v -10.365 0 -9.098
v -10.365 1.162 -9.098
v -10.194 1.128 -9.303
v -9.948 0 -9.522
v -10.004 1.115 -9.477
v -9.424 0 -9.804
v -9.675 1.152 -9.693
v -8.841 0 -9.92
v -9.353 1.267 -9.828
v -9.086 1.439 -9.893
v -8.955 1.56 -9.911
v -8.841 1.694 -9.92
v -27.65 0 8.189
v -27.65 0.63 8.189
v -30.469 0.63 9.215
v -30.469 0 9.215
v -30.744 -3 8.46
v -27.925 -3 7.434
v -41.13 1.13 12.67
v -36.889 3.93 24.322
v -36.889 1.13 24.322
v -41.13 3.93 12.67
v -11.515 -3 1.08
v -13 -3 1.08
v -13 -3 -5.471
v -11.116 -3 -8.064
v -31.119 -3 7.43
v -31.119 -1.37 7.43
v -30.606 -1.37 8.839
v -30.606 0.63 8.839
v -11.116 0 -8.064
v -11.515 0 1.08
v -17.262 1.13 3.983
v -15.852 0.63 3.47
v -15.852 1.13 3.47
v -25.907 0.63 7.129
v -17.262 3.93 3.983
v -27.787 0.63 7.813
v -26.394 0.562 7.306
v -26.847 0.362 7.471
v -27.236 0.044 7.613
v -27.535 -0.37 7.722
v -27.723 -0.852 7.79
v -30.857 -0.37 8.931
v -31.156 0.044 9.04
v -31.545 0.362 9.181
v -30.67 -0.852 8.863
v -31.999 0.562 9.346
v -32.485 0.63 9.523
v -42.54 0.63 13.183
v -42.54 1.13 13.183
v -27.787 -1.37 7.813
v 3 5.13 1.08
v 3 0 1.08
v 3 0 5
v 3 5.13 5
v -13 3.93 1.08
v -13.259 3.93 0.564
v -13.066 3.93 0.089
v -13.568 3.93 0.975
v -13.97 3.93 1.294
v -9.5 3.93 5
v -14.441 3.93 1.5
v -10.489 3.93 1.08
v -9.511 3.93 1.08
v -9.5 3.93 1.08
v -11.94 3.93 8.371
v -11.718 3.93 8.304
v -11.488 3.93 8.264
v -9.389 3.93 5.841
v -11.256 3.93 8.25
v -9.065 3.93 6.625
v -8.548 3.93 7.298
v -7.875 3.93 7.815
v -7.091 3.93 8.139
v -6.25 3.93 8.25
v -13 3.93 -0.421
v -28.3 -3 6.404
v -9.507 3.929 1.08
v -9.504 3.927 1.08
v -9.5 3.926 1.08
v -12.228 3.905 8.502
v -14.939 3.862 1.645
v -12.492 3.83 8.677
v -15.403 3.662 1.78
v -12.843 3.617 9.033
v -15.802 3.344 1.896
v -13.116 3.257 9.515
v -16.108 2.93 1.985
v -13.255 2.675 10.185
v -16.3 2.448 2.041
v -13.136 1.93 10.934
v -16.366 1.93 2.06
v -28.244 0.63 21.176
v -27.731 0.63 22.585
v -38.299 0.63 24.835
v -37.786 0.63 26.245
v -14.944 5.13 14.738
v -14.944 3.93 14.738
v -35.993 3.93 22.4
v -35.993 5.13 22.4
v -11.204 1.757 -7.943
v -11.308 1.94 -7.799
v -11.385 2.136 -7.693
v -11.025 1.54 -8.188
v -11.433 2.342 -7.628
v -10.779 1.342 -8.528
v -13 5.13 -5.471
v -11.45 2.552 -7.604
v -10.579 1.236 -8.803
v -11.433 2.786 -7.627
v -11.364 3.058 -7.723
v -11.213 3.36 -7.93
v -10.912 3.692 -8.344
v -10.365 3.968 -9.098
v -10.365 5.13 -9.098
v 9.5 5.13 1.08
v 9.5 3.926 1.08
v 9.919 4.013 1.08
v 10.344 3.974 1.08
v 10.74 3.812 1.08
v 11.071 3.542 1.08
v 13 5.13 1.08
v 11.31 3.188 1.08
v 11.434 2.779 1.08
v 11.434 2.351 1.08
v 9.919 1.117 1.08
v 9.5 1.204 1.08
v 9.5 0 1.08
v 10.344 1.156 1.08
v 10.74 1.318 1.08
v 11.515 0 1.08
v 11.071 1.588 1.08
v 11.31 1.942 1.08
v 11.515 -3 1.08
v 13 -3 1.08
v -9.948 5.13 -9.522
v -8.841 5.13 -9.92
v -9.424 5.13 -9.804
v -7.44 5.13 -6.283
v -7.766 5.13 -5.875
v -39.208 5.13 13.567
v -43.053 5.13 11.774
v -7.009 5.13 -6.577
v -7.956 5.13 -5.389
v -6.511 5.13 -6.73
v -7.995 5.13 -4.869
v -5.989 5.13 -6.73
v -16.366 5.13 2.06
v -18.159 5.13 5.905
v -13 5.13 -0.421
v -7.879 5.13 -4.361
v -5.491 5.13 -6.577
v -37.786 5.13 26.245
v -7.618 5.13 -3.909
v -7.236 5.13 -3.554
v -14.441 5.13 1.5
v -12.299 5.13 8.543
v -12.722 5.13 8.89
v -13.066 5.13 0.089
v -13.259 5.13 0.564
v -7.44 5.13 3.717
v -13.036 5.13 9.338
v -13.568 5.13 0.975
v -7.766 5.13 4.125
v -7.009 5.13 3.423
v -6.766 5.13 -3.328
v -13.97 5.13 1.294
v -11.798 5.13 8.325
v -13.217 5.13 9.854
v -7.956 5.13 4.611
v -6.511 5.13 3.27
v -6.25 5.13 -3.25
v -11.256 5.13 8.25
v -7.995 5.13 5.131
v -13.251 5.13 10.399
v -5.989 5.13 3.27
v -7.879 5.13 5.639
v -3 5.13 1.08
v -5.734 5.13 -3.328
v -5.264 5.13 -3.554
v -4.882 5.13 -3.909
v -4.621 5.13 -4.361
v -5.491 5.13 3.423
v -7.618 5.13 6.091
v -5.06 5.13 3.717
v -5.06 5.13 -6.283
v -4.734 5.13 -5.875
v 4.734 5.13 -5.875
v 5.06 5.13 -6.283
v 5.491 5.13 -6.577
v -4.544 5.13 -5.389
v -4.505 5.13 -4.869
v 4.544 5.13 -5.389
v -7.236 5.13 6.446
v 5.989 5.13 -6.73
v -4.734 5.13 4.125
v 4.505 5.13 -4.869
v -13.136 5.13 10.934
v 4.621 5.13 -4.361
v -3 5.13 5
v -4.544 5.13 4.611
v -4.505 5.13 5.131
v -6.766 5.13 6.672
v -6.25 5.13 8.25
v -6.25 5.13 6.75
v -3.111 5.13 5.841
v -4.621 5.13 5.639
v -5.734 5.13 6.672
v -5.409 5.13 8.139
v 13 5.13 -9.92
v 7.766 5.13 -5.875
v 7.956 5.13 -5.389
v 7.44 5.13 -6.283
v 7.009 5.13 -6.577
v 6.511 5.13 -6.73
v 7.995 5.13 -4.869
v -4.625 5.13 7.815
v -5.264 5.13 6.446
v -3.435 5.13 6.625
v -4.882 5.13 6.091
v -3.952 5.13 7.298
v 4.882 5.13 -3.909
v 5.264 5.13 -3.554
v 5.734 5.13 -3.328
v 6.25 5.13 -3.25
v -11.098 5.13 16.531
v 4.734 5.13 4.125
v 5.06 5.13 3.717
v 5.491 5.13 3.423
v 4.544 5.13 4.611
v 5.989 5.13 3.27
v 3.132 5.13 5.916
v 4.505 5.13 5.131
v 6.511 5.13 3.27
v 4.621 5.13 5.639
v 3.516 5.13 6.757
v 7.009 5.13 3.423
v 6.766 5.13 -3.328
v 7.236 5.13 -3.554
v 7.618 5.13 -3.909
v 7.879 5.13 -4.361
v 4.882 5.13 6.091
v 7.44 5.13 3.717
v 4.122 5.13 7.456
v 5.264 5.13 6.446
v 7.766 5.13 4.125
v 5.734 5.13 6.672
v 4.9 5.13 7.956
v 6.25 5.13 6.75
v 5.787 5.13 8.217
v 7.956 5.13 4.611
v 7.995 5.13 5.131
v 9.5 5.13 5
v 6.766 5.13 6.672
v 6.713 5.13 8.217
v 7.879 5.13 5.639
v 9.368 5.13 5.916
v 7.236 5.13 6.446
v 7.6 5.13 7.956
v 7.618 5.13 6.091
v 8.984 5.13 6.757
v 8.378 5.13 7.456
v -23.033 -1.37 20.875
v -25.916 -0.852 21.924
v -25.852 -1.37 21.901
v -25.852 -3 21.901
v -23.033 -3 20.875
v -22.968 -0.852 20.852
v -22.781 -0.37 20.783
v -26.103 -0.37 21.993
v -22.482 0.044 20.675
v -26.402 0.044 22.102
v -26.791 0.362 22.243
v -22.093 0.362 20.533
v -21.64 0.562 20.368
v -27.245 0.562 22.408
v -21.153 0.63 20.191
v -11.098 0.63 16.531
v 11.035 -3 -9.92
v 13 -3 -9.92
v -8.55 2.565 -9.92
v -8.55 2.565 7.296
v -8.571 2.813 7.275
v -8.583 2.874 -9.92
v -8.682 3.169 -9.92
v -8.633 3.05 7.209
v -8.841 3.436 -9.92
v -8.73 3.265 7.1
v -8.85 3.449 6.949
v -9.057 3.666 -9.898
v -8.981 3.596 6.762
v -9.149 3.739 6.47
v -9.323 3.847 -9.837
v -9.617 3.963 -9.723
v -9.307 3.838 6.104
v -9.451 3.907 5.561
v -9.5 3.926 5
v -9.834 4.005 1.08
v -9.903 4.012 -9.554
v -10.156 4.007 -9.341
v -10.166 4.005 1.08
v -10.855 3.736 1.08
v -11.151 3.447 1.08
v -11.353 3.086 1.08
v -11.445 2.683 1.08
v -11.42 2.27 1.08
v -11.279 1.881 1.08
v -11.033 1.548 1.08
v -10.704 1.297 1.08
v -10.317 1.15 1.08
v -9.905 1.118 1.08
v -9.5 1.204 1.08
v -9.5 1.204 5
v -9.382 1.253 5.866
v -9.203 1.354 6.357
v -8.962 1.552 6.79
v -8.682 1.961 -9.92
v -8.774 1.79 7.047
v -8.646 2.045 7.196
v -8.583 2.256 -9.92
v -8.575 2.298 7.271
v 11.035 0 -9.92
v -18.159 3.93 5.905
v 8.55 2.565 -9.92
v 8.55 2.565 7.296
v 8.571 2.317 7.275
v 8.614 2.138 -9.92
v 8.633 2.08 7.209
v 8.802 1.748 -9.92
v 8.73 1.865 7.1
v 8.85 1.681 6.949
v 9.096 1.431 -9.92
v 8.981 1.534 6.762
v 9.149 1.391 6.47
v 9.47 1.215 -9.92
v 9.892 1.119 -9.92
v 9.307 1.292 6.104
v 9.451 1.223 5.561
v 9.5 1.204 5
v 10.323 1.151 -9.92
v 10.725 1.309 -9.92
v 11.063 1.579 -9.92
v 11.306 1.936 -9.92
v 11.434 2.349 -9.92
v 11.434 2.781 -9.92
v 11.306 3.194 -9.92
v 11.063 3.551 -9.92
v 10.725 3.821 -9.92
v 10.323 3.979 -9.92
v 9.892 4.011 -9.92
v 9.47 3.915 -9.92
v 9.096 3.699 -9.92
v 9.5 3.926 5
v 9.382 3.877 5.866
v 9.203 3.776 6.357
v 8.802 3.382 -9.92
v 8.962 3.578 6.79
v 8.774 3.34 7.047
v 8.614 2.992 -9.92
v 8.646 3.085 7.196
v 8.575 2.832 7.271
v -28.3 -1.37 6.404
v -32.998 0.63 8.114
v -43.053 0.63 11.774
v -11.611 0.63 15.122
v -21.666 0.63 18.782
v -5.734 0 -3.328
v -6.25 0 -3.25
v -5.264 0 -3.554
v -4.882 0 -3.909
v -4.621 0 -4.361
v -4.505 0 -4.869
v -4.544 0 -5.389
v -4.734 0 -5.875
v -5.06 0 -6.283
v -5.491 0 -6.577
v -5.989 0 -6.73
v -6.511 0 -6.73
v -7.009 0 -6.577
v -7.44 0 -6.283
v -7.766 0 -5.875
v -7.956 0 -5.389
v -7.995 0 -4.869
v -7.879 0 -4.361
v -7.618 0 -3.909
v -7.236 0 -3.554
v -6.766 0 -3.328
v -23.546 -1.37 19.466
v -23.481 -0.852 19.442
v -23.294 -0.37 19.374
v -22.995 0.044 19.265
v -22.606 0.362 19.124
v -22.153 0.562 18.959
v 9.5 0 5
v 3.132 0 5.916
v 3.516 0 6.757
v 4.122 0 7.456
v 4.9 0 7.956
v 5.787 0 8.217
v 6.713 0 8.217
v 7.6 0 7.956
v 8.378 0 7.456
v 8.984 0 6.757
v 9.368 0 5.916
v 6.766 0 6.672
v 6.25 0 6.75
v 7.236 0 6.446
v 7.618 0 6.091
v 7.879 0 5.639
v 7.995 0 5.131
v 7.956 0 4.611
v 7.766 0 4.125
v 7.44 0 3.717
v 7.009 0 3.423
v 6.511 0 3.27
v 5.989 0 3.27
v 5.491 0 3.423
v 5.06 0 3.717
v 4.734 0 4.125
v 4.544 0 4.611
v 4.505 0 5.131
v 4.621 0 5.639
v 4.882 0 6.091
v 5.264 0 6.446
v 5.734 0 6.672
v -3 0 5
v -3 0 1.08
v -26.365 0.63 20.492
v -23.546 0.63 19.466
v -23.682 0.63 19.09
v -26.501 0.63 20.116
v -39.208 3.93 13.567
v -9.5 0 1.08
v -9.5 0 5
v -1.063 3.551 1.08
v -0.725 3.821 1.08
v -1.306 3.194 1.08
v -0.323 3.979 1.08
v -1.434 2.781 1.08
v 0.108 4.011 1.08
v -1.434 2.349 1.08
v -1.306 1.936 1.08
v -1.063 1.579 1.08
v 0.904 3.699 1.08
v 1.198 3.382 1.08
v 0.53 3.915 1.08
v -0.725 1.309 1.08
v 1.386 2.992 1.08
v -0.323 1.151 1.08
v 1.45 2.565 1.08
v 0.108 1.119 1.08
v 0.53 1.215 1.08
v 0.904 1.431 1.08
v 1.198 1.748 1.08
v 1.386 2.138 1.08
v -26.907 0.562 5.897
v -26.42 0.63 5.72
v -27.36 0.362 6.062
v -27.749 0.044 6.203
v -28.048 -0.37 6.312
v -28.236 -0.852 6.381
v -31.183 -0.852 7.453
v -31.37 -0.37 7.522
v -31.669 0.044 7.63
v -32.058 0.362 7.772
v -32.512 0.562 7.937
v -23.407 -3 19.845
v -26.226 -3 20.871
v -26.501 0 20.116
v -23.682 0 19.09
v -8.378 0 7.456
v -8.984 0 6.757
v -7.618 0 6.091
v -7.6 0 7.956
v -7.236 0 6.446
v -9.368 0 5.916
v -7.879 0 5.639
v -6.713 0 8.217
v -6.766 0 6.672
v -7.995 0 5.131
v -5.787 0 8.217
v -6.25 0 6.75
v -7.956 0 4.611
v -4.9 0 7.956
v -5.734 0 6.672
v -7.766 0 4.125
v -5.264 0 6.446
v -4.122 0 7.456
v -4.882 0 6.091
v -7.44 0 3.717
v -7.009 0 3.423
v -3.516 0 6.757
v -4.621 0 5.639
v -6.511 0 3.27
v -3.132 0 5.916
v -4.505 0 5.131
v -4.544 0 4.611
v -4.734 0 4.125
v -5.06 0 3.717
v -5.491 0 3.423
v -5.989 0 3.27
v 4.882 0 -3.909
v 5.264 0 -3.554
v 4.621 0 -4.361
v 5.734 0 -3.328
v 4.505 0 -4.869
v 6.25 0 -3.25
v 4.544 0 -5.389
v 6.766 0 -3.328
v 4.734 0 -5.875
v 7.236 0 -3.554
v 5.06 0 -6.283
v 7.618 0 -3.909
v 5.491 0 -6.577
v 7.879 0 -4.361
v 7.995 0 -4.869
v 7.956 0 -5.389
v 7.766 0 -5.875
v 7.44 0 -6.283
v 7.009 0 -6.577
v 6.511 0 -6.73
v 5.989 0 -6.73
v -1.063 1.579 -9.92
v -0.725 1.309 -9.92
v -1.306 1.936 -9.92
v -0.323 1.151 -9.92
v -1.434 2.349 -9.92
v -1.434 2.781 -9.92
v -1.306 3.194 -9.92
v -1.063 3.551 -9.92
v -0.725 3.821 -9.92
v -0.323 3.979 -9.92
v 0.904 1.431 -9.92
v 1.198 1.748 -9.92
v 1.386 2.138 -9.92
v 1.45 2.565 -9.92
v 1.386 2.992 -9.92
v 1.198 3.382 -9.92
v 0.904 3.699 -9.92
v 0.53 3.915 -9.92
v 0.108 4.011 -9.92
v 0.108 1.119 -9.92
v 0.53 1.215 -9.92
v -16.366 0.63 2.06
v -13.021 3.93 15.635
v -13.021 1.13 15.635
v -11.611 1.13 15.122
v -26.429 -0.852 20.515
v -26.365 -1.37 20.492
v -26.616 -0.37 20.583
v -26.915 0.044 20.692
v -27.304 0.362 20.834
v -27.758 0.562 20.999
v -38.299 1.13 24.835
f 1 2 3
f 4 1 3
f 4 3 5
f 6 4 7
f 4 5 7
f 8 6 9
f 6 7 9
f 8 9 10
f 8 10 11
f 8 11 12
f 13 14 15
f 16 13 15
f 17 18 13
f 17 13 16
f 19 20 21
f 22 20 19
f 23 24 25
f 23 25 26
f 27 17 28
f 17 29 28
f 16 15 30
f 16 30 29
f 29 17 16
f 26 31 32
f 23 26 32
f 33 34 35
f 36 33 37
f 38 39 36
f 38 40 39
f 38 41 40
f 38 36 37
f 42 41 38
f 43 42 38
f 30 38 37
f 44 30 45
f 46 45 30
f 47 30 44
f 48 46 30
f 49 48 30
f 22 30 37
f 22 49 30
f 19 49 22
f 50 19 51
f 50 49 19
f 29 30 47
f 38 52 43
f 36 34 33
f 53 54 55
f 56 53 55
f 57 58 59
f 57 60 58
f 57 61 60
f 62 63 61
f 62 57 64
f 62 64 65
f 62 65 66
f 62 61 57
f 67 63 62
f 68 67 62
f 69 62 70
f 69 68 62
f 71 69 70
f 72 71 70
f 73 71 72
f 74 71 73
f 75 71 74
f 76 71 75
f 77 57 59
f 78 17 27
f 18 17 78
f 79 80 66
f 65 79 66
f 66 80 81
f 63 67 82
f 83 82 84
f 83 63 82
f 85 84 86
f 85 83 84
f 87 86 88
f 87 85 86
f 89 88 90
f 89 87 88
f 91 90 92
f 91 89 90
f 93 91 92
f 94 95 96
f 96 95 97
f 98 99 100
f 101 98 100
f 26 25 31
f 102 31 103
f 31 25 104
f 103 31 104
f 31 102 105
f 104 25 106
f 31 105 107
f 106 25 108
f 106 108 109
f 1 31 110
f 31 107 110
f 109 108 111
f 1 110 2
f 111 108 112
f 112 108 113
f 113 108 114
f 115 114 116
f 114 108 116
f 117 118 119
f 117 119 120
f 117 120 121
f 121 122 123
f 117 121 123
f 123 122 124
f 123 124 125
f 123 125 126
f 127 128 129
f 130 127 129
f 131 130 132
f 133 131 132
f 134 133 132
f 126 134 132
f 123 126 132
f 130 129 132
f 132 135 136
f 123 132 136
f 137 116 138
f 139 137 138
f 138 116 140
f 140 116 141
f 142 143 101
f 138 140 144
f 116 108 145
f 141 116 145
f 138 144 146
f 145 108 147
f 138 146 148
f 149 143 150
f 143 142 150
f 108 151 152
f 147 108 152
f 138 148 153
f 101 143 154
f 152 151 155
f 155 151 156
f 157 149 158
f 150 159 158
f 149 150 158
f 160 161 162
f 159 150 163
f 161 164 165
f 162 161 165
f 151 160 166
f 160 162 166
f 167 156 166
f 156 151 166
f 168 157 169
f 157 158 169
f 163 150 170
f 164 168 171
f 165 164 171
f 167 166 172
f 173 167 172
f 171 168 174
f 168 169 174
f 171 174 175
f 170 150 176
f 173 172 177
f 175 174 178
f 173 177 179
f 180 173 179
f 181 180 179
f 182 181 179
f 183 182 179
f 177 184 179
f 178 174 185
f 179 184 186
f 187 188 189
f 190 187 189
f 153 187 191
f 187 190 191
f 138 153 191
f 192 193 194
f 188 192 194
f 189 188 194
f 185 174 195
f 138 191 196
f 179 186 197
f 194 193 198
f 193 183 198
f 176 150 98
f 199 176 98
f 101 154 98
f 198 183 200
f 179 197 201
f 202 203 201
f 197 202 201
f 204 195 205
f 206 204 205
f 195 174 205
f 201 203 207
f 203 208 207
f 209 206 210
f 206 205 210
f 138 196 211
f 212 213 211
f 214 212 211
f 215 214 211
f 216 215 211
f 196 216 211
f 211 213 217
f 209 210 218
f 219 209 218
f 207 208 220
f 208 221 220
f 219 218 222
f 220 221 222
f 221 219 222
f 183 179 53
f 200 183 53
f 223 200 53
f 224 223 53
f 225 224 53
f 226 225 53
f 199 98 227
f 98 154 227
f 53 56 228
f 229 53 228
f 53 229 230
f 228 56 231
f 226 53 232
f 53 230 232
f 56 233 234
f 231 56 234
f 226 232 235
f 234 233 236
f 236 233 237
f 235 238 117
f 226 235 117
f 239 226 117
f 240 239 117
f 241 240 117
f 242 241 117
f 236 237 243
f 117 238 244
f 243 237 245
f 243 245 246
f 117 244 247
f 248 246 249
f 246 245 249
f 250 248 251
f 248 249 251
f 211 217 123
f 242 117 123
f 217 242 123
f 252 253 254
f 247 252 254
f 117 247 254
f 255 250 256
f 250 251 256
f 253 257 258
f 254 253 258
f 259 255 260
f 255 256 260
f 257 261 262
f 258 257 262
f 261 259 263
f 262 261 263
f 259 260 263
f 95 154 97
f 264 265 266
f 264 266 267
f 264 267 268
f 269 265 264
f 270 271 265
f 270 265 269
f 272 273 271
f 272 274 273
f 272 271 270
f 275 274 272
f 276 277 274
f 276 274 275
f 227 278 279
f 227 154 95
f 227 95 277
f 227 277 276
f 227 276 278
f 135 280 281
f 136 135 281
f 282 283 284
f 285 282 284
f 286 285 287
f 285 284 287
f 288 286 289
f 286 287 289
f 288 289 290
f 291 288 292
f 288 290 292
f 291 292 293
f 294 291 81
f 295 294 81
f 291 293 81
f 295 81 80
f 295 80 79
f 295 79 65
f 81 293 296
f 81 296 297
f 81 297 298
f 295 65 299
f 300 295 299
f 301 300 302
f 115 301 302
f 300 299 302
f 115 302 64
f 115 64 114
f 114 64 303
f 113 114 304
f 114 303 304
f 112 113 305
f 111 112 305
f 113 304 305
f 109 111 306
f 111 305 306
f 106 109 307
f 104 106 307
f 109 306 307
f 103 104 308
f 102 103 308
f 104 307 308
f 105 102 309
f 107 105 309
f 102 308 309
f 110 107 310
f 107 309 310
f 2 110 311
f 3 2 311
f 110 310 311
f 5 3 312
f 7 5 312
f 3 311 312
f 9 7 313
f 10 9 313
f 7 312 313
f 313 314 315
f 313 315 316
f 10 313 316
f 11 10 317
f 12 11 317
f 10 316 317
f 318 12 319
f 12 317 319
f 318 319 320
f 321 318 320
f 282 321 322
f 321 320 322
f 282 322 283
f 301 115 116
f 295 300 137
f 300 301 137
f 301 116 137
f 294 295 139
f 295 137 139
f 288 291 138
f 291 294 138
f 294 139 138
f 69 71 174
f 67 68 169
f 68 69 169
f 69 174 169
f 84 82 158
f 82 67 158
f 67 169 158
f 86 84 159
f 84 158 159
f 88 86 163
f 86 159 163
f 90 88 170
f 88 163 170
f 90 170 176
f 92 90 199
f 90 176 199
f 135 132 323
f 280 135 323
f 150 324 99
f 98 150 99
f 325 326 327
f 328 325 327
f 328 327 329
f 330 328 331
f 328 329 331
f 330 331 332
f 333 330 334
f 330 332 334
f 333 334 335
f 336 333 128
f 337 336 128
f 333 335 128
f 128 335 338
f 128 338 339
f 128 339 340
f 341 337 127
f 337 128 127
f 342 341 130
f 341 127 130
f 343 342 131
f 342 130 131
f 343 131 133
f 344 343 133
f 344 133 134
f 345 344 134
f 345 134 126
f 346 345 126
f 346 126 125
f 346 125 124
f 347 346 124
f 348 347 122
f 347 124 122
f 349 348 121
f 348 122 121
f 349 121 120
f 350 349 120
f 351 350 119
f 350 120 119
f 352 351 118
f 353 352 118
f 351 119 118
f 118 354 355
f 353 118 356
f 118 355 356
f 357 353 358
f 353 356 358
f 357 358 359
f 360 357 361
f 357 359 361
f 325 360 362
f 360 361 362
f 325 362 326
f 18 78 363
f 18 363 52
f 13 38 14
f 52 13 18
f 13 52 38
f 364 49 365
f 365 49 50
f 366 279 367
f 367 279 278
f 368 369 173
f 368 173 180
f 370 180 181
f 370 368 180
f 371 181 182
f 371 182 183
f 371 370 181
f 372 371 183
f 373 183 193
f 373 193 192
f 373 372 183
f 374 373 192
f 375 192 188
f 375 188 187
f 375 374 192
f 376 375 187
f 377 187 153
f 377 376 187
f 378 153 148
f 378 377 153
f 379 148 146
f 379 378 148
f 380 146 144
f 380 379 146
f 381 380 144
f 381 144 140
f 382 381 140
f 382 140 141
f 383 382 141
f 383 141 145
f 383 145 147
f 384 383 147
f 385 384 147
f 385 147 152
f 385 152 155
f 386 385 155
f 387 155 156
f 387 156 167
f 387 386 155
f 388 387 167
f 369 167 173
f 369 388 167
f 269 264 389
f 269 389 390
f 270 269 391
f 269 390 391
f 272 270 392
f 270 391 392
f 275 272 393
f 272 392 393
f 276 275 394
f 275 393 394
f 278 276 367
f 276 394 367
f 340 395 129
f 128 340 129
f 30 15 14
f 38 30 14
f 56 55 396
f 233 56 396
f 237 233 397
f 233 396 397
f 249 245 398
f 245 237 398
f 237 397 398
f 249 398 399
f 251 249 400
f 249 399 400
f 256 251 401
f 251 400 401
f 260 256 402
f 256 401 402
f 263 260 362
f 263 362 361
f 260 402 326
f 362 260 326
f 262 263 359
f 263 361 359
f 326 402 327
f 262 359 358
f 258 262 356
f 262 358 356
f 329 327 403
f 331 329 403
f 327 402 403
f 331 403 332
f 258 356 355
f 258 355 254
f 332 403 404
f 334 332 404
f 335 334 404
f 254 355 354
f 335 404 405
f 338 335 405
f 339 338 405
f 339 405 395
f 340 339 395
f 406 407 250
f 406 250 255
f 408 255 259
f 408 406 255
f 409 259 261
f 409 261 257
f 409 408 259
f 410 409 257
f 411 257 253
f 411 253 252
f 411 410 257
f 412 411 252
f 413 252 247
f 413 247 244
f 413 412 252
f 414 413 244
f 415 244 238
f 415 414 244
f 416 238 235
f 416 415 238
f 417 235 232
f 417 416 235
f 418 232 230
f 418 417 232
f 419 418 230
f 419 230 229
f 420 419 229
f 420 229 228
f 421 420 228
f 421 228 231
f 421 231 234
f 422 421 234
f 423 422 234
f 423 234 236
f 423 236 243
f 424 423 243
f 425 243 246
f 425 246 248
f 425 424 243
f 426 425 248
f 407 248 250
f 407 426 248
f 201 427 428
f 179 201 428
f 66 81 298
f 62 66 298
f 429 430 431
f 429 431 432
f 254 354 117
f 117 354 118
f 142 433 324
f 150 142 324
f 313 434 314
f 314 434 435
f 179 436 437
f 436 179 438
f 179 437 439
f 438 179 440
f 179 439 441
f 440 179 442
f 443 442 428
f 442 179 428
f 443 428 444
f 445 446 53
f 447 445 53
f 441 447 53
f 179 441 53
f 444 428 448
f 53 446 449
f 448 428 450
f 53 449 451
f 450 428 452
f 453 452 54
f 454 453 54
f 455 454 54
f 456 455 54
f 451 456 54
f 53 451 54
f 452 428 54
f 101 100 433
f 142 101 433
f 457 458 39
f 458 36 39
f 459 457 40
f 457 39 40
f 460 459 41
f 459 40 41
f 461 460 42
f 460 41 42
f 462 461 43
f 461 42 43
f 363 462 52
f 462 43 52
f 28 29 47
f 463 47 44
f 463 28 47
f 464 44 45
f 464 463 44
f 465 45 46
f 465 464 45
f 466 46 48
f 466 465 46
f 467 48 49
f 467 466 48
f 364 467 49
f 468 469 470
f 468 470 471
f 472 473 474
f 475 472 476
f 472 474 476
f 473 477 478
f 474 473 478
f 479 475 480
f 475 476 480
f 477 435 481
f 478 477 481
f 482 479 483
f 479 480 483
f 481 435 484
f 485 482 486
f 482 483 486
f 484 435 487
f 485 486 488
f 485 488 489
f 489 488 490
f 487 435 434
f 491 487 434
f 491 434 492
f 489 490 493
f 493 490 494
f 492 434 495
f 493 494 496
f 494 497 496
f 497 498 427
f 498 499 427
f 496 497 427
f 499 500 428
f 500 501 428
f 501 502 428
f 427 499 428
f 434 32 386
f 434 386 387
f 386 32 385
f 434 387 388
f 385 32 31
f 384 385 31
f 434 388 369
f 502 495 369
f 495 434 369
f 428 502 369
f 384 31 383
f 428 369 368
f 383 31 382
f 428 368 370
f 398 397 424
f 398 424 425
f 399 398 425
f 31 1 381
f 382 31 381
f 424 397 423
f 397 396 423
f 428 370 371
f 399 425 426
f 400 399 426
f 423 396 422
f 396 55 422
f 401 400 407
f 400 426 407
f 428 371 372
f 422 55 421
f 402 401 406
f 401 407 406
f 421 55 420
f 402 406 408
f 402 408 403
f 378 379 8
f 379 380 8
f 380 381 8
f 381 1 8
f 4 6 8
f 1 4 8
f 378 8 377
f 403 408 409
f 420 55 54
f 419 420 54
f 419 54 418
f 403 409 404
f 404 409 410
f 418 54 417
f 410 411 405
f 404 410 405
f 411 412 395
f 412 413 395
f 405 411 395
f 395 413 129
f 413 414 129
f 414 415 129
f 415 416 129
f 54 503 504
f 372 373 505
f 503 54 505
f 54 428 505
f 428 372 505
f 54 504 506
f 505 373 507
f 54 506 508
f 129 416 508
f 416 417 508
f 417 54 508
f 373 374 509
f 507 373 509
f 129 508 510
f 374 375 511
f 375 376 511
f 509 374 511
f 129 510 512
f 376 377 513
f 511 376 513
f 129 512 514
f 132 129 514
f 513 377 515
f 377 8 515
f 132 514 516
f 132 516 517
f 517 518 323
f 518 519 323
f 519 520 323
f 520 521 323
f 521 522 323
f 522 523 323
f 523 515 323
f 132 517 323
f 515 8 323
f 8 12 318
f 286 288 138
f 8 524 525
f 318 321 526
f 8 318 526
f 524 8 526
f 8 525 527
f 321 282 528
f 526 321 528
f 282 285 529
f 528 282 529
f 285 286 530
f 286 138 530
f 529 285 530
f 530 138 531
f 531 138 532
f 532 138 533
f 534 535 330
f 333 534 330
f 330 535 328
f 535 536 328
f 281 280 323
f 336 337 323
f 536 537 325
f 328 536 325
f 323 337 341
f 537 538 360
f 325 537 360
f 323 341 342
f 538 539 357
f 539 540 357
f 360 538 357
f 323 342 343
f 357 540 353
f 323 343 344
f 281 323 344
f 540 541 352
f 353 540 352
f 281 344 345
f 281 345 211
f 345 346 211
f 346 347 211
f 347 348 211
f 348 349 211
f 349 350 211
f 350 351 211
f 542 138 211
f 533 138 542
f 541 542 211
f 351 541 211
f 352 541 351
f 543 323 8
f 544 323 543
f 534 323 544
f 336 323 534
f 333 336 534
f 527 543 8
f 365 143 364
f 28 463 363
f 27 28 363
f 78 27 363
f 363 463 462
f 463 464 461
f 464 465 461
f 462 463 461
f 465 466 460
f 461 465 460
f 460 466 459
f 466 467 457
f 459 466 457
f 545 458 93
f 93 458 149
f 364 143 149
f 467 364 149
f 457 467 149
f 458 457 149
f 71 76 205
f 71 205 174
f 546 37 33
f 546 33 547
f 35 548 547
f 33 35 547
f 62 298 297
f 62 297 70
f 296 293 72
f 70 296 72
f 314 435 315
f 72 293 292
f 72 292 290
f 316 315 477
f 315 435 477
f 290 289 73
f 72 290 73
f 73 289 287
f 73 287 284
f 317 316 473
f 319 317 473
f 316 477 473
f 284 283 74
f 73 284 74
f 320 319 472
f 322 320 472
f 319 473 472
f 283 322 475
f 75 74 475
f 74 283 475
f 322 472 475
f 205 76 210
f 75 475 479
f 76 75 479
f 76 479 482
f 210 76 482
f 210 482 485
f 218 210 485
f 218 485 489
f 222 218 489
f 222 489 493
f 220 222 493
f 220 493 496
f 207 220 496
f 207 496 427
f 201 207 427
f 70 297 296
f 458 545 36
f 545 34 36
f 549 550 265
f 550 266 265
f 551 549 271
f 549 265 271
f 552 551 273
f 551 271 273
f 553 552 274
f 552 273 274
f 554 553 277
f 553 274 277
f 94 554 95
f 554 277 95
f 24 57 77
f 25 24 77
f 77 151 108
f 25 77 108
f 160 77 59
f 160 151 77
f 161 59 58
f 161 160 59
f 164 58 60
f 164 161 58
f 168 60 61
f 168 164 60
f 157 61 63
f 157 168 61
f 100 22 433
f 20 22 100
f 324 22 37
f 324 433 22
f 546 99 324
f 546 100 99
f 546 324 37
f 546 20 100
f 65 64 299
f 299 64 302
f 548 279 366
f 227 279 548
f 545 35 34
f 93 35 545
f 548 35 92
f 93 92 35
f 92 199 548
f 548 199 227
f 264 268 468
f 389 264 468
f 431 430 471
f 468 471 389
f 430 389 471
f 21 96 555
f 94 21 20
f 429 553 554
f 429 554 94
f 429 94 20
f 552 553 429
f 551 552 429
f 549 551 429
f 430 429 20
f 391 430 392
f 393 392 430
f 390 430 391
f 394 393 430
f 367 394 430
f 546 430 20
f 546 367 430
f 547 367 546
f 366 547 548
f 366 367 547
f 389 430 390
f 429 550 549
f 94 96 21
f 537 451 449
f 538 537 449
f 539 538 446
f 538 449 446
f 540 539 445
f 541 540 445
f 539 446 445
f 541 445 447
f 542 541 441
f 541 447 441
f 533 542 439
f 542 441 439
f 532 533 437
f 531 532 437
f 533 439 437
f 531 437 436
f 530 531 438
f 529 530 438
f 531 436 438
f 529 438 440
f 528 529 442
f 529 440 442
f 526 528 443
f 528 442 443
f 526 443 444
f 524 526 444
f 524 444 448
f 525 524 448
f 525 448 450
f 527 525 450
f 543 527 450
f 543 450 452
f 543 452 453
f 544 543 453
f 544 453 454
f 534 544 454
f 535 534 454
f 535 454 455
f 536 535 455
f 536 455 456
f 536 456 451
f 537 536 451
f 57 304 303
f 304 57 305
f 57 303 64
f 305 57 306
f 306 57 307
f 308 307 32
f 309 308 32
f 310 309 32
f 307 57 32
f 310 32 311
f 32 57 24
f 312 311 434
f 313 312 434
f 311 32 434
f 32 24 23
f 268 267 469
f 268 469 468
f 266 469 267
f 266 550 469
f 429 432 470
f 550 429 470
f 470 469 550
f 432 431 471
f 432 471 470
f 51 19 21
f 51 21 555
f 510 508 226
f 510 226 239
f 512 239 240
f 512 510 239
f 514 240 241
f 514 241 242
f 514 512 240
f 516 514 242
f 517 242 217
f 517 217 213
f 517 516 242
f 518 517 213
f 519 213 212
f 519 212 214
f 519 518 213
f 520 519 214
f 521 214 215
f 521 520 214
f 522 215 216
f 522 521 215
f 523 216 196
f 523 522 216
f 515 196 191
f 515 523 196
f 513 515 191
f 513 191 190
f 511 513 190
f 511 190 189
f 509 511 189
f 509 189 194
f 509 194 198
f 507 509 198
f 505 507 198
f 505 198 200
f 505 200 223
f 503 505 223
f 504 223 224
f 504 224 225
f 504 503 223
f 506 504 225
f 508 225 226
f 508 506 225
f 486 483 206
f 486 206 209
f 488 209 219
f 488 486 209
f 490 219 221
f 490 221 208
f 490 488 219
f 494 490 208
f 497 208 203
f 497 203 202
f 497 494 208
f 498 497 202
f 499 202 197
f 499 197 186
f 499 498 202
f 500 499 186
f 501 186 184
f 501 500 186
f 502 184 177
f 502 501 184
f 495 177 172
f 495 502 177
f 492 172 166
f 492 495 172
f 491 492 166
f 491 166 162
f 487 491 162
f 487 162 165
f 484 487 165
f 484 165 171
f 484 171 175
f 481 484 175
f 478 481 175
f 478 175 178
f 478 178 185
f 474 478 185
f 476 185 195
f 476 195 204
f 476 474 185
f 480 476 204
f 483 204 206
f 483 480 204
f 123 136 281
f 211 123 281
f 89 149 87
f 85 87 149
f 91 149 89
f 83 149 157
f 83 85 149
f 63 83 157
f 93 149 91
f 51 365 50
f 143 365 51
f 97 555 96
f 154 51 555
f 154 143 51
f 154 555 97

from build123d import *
from OCP.BRepFilletAPI import BRepFilletAPI_MakeChamfer

# Parameters (mm, degrees)
SKETCH1_W           = 26
SKETCH1_H           = 19.84
SKETCH1_R           = 1.7499999999999998
BOSS_EXTRUDE1_DEPTH = 5.13
CUT_EXTRUDE1_REACH  = 26.268
SKETCH2_R           = 1.45
BOSS_EXTRUDE2_DEPTH = 3
CUT_EXTRUDE2_REACH  = 20.262
CUT_EXTRUDE3_REACH  = 20.262
BOSS_EXTRUDE3_START = 1.2
BOSS_EXTRUDE3_DEPTH = 1.2
BOSS_EXTRUDE6_DEPTH = 3.3
BOSS_EXTRUDE7_DEPTH = 0.8
CUT_EXTRUDE4_DEPTH  = 0.5
CUT_EXTRUDE5_REACH  = 52.896
BOSS_EXTRUDE8_DEPTH = 2.83
FILLET1_R           = 2
CHAMFER1_SIZE       = 3
CHAMFER1_SIZE2      = 0.8038475772933701


with BuildPart() as part:
    # Sketch1 → Boss-Extrude1 (new body)
    with BuildSketch(Plane(origin=(0, 0, 0), x_dir=(1, 0, 0), z_dir=(0, 1, 0))):
        Rectangle(SKETCH1_W, SKETCH1_H)
        with Locations(Location((6.250000000000003, -4.999999999999995, 0), (0, 0, 270))):
            Circle(SKETCH1_R, mode=Mode.SUBTRACT)
        with Locations(Location((-6.250000000000001, -5, 0), (0, 0, 270))):
            Circle(SKETCH1_R, mode=Mode.SUBTRACT)
        with Locations(Location((-6.250000000000001, 5, 0), (0, 0, 270))):
            Circle(SKETCH1_R, mode=Mode.SUBTRACT)
        with Locations(Location((6.249999999999999, 4.999999999999998, 0), (0, 0, 270))):
            Circle(SKETCH1_R, mode=Mode.SUBTRACT)
    extrude(amount=BOSS_EXTRUDE1_DEPTH)

    # Sketch2 → Cut-Extrude1 (cut, up to next)
    with BuildSketch(Plane.XY.offset(9.92), mode=Mode.PRIVATE) as cut_extrude1_sk1:
        with Locations((0, 2.565)):
            Circle(SKETCH2_R)
    cut_extrude1_tool1 = extrude(cut_extrude1_sk1.sketch, amount=-CUT_EXTRUDE1_REACH, mode=Mode.PRIVATE) & part.part
    # Sketch2 → Cut-Extrude1 (cut, up to next)
    with BuildSketch(Plane.XY.offset(9.92), mode=Mode.PRIVATE) as cut_extrude1_sk2:
        with Locations((-10, 2.565)):
            Circle(SKETCH2_R)
    cut_extrude1_tool2 = extrude(cut_extrude1_sk2.sketch, amount=-CUT_EXTRUDE1_REACH, mode=Mode.PRIVATE) & part.part
    # Sketch2 → Cut-Extrude1 (cut, up to next)
    with BuildSketch(Plane.XY.offset(9.92), mode=Mode.PRIVATE) as cut_extrude1_sk3:
        with Locations(Location((10, 2.565, 0), (0, 0, 180))):
            Circle(SKETCH2_R)
    cut_extrude1_tool3 = extrude(cut_extrude1_sk3.sketch, amount=-CUT_EXTRUDE1_REACH, mode=Mode.PRIVATE) & part.part
    add(cut_extrude1_tool1.solids().sort_by_distance((0, 2.565, 9.92))[0], mode=Mode.SUBTRACT)
    add(cut_extrude1_tool2.solids().sort_by_distance((-10, 2.565, 9.92))[0], mode=Mode.SUBTRACT)
    add(cut_extrude1_tool3.solids().sort_by_distance((10, 2.565, 9.92))[0], mode=Mode.SUBTRACT)

    # Sketch3 → Boss-Extrude2 (add)
    with BuildSketch(Plane.XZ):
        with BuildLine():
            Line((-13, -9.919999999999998), (-11.034999999999997, -9.919999999999998))
            Line((-11.034999999999997, -9.92), (-11.63, 3.710000000000001))
            add(Edge.make_bspline(
                [(-11.63, 3.7100000000000013), (-10.51224572230246, 4.466321985960096), (-10.92, 6.040000000000002)],
                knots=[0, 0, 0, 1, 1, 1], degree=2))
            Line((-10.92, 6.040000000000002), (-9.0061377245509, 9.92))
            Line((-9.0061377245509, 9.92), (-13.000000000000002, 9.92))
            Line((-13.000000000000002, 9.92), (-13, -9.919999999999996))
        make_face()
        with BuildLine():
            Line((11.63, 3.7100000000000044), (11.035000000000004, -9.919999999999996))
            Line((11.035000000000004, -9.92), (13, -9.92))
            Line((12.999999999999998, -9.919999999999998), (12.999999999999995, 9.919999999999998))
            Line((12.999999999999995, 9.919999999999998), (9.006137724550902, 9.919999999999998))
            Line((9.0061377245509, 9.920000000000002), (10.92, 6.0400000000000045))
            add(Edge.make_bspline(
                [(11.63, 3.7100000000000044), (10.512245722302461, 4.466321985960101), (10.92, 6.0400000000000045)],
                knots=[0, 0, 0, 1, 1, 1], degree=2))
        make_face()
    extrude(amount=BOSS_EXTRUDE2_DEPTH)

    # Sketch4 → Cut-Extrude2 (cut, up to next)
    with BuildSketch(Plane.XZ.offset(3), mode=Mode.PRIVATE) as cut_extrude2_sk1:
        with BuildLine():
            Line((-13.000000000000002, 9.92), (-13.000000000000002, 1.0799999999999994))
            Line((-13.000000000000002, 1.0799999999999994), (-9.5, 1.0799999999999994))
            Line((-9.5, 1.0799999999999992), (-9.500000000000002, 5))
            ThreePointArc((-9.5, 4.999999999999999), (-6.250000000000002, 8.25), (-3.000000000000001, 5))
            Line((-3.000000000000001, 5), (-3.000000000000001, 1.0799999999999992))
            Line((-3.0000000000000018, 1.0799999999999994), (3.0000000000000018, 1.0799999999999994))
            Line((3.0000000000000027, 1.0799999999999992), (3.0000000000000036, 4.999999999999995))
            ThreePointArc((3.0000000000000027, 4.999999999999994), (6.250000000000002, 8.249999999999995), (9.500000000000004, 4.999999999999995))
            Line((9.500000000000002, 4.999999999999995), (9.500000000000002, 1.0799999999999992))
            Line((9.500000000000002, 1.0799999999999994), (11.515190755685987, 1.0799999999999994))
            Line((11.515190755685987, 1.0799999999999996), (11.63, 3.710000000000005))
            add(Edge.make_bspline(
                [(10.92, 6.0400000000000045), (10.512245722302461, 4.466321985960101), (11.63, 3.7100000000000044)],
                knots=[0, 0, 0, 1, 1, 1], degree=2))
            Line((10.92, 6.040000000000005), (9.006137724550895, 9.920000000000002))
            Line((9.006137724550895, 9.92), (-13.000000000000002, 9.92))
        make_face()
    cut_extrude2_tool1 = extrude(cut_extrude2_sk1.sketch, amount=-CUT_EXTRUDE2_REACH, mode=Mode.PRIVATE) & part.part
    # Sketch4 → Cut-Extrude2 (cut, up to next)
    with BuildSketch(Plane.XZ.offset(3), mode=Mode.PRIVATE) as cut_extrude2_sk2:
        with BuildLine():
            Line((12.999999999999998, 9.92), (9.006137724550895, 9.92))
            Line((9.006137724550895, 9.920000000000002), (10.92, 6.040000000000005))
            add(Edge.make_bspline(
                [(10.92, 6.0400000000000045), (10.512245722302461, 4.466321985960101), (11.63, 3.7100000000000044)],
                knots=[0, 0, 0, 1, 1, 1], degree=2))
            Line((11.63, 3.710000000000005), (11.515190755685987, 1.0799999999999996))
            Line((11.515190755685987, 1.0799999999999994), (12.999999999999998, 1.0799999999999994))
            Line((12.999999999999998, 1.08), (12.999999999999998, 9.92))
        make_face()
    cut_extrude2_tool2 = extrude(cut_extrude2_sk2.sketch, amount=-CUT_EXTRUDE2_REACH, mode=Mode.PRIVATE) & part.part
    add(cut_extrude2_tool1.solids().sort_by_distance((-1.890933, -3, 6.129401))[0], mode=Mode.SUBTRACT)
    add(cut_extrude2_tool2.solids().sort_by_distance((11.717022, -3, 6.350704))[0], mode=Mode.SUBTRACT)

    # Sketch5 → Cut-Extrude3 (cut, up to next)
    with BuildSketch(Plane(origin=(0, 5.13, 0), x_dir=(1, 0, 0), z_dir=(0, 1, 0)), mode=Mode.PRIVATE) as cut_extrude3_sk1:
        with BuildLine():
            Line((-13.000000000000002, 9.92), (-13.000000000000002, 5.470620579870581))
            Line((-13.000000000000004, 5.470620579870581), (-10.364706936690006, 9.097790307353499))
            ThreePointArc((-10.364706936690006, 9.097790307353499), (-9.696381549071102, 9.682348654000137), (-8.840876363748032, 9.919999999999996))
            Line((-8.840876363748032, 9.92), (-13.000000000000002, 9.92))
        make_face()
    cut_extrude3_tool1 = extrude(cut_extrude3_sk1.sketch, amount=-CUT_EXTRUDE3_REACH, mode=Mode.PRIVATE) & part.part
    add(cut_extrude3_tool1.solids().sort_by_distance((-11.876404, 5.13, -8.463849))[0], mode=Mode.SUBTRACT)

    # Sketch6 → Boss-Extrude3 (add)
    # profile 1 of 3: a face of its own
    with BuildSketch(Plane.XZ.offset(-5.13).offset(BOSS_EXTRUDE3_START)):
        Polygon((-11.098405421888891, 16.531452984385147), (-37.78567585220869, 26.24482505483415), (-43.05278605942399, 11.773558694731163), (-16.36551562910419, 2.060186624282162), (-14.112607804680097, 8.249999999999996), align=None)
        Polygon((-17.262024345294556, 3.9827557704495273), (-41.13021691325662, 12.67006741092152), (-36.88916713601833, 24.322255908666786), (-13.02097456805626, 15.63494426819479), align=None, mode=Mode.SUBTRACT)
    # profile 2 of 3: a face of its own
    with BuildSketch(Plane.XZ.offset(-5.13).offset(BOSS_EXTRUDE3_START)):
        Polygon((-41.13021691325662, 12.67006741092152), (-17.262024345294556, 3.982755770449528), (-13.020974568056259, 15.63494426819479), (-36.88916713601833, 24.322255908666786), align=None)
    # profile 3 of 3: a face of its own
    with BuildSketch(Plane.XZ.offset(-5.13).offset(BOSS_EXTRUDE3_START)):
        with BuildLine():
            Line((-6.250000000000001, 8.25), (-14.1126078046801, 8.249999999999998))
            Line((-14.112607804680097, 8.249999999999996), (-16.36551562910419, 2.060186624282161))
            Line((-16.36551562910419, 2.060186624282161), (-13.000000000000002, 1.0799999999999994))
            Line((-13.000000000000002, 1.0799999999999994), (-9.500000000000002, 1.0799999999999994))
            Line((-9.500000000000002, 1.0799999999999992), (-9.500000000000002, 5))
            ThreePointArc((-9.500000000000002, 5), (-8.54809703885628, 7.29809703885628), (-6.250000000000001, 8.25))
        make_face()
    extrude(amount=-BOSS_EXTRUDE3_DEPTH)

    # Sketch9 → Boss-Extrude6 (add)
    with BuildSketch(Plane.XZ.offset(-3.93)):
        Polygon((-43.052786059423994, 11.773558694731161), (-37.78567585220869, 26.244825054834152), (-11.098405421888893, 16.531452984385147), (-16.36551562910419, 2.060186624282161), align=None)
        Polygon((-41.13021691325663, 12.670067410921524), (-17.262024345294552, 3.982755770449528), (-13.020974568056255, 15.63494426819479), (-36.88916713601834, 24.32225590866679), align=None, mode=Mode.SUBTRACT)
    extrude(amount=BOSS_EXTRUDE6_DEPTH)

    # Sketch10 → Boss-Extrude7 (add)
    with BuildSketch(Plane.XZ.offset(-0.6300000000000003)):
        Polygon((-31.118689775442956, 7.429902874495164), (-28.299611913085236, 6.403842444518162), (-27.64977364076646, 8.189258424011385), (-30.46885150312418, 9.215318853988391), align=None)
        Polygon((-25.85157956822766, 21.901169234598154), (-23.032501705869944, 20.875108804621146), (-23.68233997818871, 19.089692825127923), (-26.50141784054643, 20.115753255104927), align=None)
    extrude(amount=BOSS_EXTRUDE7_DEPTH)

    # Sketch11 → Cut-Extrude4 (cut)
    with BuildSketch(Plane.XZ.offset(-0.6300000000000003)):
        Polygon((-17.262024345294552, 3.982755770449528), (-13.020974568056257, 15.634944268194793), (-11.611435636877394, 15.12191405320629), (-15.852485414115685, 3.469725555461025), align=None)
        Polygon((-36.889167136018344, 24.322255908666797), (-41.13021691325663, 12.670067410921524), (-42.53975584443549, 13.183097625910026), (-38.298706067197195, 24.835286123655298), align=None)
    extrude(amount=-CUT_EXTRUDE4_DEPTH, mode=Mode.SUBTRACT)

    # Sketch12 → Cut-Extrude5 (cut, up to next)
    with BuildSketch(Plane.XZ.offset(-3.93), mode=Mode.PRIVATE) as cut_extrude5_sk1:
        Polygon((-18.15853306148491, 5.9053249166168955), (-14.94354371422362, 14.738435552004432), (-35.99265841982798, 22.399686762499428), (-39.20764776708926, 13.566576127111883), align=None)
    cut_extrude5_tool1 = extrude(cut_extrude5_sk1.sketch, amount=-CUT_EXTRUDE5_REACH, mode=Mode.PRIVATE) & part.part
    add(cut_extrude5_tool1.solids().sort_by_distance((-27.075596, 3.93, 14.152506))[0], mode=Mode.SUBTRACT)

    # Sketch13 → Boss-Extrude8 (add)
    with BuildSketch(Plane.XZ.offset(0.16999999999999968)):
        Polygon((-30.46885150312418, 9.215318853988391), (-31.118689775442956, 7.429902874495164), (-28.299611913085236, 6.403842444518162), (-27.64977364076646, 8.189258424011385), align=None)
        Polygon((-25.85157956822766, 21.901169234598154), (-26.50141784054643, 20.115753255104927), (-23.68233997818871, 19.089692825127923), (-23.032501705869944, 20.875108804621146), align=None)
    extrude(amount=BOSS_EXTRUDE8_DEPTH)

    # Fillet1
    fillet1_edges = [part.edges().sort_by_distance(p)[0] for p in [
        (-30.862174667948704, 0.6300000000000003, 8.134672340084595),
        (-26.10809467572191, 0.6300000000000003, 21.196399769008725),
        (-23.289016813364192, 0.6300000000000003, 20.170339339031717),
        (-28.04309680559098, 0.6300000000000003, 7.108611910107593),
        (-13.000000000000002, 4.529999999999999, 1.0799999999999994),
        (-14.1126078046801, 4.529999999999999, 8.249999999999996),
        (-15.239061716892145, 3.93, 5.155093312141078),
    ]]
    fillet(fillet1_edges, radius=FILLET1_R)

    # Chamfer1: one chamfer whose edges measure the first distance from different faces: ONE call of the kernel's chamfer builder (chamfer() names one face for all edges)
    chamfer1_edges_1 = [part.edges().sort_by_distance(p)[0] for p in [
        (-29.05931257194532, -2.9999999999999996, 8.702288638999889),
    ]]
    chamfer1_side_1 = [part.faces().sort_by_distance(p)[0] for p in [
        (-29.059312571945316, -1.1849999999999996, 8.702288638999887),
    ]]
    chamfer1_edges_2 = [part.edges().sort_by_distance(p)[0] for p in [
        (-25.091878909367573, -2.9999999999999996, 19.602723040116423),
    ]]
    chamfer1_side_2 = [part.faces().sort_by_distance(p)[0] for p in [
        (-25.091878909367573, -1.1849999999999996, 19.602723040116427),
    ]]
    chamfer1 = BRepFilletAPI_MakeChamfer(part.part.solid().wrapped)
    for e in chamfer1_edges_1:
        chamfer1.Add(CHAMFER1_SIZE, CHAMFER1_SIZE2, e.wrapped, chamfer1_side_1[0].wrapped)  # the first distance lies on this face
    for e in chamfer1_edges_2:
        chamfer1.Add(CHAMFER1_SIZE, CHAMFER1_SIZE2, e.wrapped, chamfer1_side_2[0].wrapped)  # the first distance lies on this face
    add(Compound.cast(chamfer1.Shape()), mode=Mode.REPLACE)


solid = part.part
